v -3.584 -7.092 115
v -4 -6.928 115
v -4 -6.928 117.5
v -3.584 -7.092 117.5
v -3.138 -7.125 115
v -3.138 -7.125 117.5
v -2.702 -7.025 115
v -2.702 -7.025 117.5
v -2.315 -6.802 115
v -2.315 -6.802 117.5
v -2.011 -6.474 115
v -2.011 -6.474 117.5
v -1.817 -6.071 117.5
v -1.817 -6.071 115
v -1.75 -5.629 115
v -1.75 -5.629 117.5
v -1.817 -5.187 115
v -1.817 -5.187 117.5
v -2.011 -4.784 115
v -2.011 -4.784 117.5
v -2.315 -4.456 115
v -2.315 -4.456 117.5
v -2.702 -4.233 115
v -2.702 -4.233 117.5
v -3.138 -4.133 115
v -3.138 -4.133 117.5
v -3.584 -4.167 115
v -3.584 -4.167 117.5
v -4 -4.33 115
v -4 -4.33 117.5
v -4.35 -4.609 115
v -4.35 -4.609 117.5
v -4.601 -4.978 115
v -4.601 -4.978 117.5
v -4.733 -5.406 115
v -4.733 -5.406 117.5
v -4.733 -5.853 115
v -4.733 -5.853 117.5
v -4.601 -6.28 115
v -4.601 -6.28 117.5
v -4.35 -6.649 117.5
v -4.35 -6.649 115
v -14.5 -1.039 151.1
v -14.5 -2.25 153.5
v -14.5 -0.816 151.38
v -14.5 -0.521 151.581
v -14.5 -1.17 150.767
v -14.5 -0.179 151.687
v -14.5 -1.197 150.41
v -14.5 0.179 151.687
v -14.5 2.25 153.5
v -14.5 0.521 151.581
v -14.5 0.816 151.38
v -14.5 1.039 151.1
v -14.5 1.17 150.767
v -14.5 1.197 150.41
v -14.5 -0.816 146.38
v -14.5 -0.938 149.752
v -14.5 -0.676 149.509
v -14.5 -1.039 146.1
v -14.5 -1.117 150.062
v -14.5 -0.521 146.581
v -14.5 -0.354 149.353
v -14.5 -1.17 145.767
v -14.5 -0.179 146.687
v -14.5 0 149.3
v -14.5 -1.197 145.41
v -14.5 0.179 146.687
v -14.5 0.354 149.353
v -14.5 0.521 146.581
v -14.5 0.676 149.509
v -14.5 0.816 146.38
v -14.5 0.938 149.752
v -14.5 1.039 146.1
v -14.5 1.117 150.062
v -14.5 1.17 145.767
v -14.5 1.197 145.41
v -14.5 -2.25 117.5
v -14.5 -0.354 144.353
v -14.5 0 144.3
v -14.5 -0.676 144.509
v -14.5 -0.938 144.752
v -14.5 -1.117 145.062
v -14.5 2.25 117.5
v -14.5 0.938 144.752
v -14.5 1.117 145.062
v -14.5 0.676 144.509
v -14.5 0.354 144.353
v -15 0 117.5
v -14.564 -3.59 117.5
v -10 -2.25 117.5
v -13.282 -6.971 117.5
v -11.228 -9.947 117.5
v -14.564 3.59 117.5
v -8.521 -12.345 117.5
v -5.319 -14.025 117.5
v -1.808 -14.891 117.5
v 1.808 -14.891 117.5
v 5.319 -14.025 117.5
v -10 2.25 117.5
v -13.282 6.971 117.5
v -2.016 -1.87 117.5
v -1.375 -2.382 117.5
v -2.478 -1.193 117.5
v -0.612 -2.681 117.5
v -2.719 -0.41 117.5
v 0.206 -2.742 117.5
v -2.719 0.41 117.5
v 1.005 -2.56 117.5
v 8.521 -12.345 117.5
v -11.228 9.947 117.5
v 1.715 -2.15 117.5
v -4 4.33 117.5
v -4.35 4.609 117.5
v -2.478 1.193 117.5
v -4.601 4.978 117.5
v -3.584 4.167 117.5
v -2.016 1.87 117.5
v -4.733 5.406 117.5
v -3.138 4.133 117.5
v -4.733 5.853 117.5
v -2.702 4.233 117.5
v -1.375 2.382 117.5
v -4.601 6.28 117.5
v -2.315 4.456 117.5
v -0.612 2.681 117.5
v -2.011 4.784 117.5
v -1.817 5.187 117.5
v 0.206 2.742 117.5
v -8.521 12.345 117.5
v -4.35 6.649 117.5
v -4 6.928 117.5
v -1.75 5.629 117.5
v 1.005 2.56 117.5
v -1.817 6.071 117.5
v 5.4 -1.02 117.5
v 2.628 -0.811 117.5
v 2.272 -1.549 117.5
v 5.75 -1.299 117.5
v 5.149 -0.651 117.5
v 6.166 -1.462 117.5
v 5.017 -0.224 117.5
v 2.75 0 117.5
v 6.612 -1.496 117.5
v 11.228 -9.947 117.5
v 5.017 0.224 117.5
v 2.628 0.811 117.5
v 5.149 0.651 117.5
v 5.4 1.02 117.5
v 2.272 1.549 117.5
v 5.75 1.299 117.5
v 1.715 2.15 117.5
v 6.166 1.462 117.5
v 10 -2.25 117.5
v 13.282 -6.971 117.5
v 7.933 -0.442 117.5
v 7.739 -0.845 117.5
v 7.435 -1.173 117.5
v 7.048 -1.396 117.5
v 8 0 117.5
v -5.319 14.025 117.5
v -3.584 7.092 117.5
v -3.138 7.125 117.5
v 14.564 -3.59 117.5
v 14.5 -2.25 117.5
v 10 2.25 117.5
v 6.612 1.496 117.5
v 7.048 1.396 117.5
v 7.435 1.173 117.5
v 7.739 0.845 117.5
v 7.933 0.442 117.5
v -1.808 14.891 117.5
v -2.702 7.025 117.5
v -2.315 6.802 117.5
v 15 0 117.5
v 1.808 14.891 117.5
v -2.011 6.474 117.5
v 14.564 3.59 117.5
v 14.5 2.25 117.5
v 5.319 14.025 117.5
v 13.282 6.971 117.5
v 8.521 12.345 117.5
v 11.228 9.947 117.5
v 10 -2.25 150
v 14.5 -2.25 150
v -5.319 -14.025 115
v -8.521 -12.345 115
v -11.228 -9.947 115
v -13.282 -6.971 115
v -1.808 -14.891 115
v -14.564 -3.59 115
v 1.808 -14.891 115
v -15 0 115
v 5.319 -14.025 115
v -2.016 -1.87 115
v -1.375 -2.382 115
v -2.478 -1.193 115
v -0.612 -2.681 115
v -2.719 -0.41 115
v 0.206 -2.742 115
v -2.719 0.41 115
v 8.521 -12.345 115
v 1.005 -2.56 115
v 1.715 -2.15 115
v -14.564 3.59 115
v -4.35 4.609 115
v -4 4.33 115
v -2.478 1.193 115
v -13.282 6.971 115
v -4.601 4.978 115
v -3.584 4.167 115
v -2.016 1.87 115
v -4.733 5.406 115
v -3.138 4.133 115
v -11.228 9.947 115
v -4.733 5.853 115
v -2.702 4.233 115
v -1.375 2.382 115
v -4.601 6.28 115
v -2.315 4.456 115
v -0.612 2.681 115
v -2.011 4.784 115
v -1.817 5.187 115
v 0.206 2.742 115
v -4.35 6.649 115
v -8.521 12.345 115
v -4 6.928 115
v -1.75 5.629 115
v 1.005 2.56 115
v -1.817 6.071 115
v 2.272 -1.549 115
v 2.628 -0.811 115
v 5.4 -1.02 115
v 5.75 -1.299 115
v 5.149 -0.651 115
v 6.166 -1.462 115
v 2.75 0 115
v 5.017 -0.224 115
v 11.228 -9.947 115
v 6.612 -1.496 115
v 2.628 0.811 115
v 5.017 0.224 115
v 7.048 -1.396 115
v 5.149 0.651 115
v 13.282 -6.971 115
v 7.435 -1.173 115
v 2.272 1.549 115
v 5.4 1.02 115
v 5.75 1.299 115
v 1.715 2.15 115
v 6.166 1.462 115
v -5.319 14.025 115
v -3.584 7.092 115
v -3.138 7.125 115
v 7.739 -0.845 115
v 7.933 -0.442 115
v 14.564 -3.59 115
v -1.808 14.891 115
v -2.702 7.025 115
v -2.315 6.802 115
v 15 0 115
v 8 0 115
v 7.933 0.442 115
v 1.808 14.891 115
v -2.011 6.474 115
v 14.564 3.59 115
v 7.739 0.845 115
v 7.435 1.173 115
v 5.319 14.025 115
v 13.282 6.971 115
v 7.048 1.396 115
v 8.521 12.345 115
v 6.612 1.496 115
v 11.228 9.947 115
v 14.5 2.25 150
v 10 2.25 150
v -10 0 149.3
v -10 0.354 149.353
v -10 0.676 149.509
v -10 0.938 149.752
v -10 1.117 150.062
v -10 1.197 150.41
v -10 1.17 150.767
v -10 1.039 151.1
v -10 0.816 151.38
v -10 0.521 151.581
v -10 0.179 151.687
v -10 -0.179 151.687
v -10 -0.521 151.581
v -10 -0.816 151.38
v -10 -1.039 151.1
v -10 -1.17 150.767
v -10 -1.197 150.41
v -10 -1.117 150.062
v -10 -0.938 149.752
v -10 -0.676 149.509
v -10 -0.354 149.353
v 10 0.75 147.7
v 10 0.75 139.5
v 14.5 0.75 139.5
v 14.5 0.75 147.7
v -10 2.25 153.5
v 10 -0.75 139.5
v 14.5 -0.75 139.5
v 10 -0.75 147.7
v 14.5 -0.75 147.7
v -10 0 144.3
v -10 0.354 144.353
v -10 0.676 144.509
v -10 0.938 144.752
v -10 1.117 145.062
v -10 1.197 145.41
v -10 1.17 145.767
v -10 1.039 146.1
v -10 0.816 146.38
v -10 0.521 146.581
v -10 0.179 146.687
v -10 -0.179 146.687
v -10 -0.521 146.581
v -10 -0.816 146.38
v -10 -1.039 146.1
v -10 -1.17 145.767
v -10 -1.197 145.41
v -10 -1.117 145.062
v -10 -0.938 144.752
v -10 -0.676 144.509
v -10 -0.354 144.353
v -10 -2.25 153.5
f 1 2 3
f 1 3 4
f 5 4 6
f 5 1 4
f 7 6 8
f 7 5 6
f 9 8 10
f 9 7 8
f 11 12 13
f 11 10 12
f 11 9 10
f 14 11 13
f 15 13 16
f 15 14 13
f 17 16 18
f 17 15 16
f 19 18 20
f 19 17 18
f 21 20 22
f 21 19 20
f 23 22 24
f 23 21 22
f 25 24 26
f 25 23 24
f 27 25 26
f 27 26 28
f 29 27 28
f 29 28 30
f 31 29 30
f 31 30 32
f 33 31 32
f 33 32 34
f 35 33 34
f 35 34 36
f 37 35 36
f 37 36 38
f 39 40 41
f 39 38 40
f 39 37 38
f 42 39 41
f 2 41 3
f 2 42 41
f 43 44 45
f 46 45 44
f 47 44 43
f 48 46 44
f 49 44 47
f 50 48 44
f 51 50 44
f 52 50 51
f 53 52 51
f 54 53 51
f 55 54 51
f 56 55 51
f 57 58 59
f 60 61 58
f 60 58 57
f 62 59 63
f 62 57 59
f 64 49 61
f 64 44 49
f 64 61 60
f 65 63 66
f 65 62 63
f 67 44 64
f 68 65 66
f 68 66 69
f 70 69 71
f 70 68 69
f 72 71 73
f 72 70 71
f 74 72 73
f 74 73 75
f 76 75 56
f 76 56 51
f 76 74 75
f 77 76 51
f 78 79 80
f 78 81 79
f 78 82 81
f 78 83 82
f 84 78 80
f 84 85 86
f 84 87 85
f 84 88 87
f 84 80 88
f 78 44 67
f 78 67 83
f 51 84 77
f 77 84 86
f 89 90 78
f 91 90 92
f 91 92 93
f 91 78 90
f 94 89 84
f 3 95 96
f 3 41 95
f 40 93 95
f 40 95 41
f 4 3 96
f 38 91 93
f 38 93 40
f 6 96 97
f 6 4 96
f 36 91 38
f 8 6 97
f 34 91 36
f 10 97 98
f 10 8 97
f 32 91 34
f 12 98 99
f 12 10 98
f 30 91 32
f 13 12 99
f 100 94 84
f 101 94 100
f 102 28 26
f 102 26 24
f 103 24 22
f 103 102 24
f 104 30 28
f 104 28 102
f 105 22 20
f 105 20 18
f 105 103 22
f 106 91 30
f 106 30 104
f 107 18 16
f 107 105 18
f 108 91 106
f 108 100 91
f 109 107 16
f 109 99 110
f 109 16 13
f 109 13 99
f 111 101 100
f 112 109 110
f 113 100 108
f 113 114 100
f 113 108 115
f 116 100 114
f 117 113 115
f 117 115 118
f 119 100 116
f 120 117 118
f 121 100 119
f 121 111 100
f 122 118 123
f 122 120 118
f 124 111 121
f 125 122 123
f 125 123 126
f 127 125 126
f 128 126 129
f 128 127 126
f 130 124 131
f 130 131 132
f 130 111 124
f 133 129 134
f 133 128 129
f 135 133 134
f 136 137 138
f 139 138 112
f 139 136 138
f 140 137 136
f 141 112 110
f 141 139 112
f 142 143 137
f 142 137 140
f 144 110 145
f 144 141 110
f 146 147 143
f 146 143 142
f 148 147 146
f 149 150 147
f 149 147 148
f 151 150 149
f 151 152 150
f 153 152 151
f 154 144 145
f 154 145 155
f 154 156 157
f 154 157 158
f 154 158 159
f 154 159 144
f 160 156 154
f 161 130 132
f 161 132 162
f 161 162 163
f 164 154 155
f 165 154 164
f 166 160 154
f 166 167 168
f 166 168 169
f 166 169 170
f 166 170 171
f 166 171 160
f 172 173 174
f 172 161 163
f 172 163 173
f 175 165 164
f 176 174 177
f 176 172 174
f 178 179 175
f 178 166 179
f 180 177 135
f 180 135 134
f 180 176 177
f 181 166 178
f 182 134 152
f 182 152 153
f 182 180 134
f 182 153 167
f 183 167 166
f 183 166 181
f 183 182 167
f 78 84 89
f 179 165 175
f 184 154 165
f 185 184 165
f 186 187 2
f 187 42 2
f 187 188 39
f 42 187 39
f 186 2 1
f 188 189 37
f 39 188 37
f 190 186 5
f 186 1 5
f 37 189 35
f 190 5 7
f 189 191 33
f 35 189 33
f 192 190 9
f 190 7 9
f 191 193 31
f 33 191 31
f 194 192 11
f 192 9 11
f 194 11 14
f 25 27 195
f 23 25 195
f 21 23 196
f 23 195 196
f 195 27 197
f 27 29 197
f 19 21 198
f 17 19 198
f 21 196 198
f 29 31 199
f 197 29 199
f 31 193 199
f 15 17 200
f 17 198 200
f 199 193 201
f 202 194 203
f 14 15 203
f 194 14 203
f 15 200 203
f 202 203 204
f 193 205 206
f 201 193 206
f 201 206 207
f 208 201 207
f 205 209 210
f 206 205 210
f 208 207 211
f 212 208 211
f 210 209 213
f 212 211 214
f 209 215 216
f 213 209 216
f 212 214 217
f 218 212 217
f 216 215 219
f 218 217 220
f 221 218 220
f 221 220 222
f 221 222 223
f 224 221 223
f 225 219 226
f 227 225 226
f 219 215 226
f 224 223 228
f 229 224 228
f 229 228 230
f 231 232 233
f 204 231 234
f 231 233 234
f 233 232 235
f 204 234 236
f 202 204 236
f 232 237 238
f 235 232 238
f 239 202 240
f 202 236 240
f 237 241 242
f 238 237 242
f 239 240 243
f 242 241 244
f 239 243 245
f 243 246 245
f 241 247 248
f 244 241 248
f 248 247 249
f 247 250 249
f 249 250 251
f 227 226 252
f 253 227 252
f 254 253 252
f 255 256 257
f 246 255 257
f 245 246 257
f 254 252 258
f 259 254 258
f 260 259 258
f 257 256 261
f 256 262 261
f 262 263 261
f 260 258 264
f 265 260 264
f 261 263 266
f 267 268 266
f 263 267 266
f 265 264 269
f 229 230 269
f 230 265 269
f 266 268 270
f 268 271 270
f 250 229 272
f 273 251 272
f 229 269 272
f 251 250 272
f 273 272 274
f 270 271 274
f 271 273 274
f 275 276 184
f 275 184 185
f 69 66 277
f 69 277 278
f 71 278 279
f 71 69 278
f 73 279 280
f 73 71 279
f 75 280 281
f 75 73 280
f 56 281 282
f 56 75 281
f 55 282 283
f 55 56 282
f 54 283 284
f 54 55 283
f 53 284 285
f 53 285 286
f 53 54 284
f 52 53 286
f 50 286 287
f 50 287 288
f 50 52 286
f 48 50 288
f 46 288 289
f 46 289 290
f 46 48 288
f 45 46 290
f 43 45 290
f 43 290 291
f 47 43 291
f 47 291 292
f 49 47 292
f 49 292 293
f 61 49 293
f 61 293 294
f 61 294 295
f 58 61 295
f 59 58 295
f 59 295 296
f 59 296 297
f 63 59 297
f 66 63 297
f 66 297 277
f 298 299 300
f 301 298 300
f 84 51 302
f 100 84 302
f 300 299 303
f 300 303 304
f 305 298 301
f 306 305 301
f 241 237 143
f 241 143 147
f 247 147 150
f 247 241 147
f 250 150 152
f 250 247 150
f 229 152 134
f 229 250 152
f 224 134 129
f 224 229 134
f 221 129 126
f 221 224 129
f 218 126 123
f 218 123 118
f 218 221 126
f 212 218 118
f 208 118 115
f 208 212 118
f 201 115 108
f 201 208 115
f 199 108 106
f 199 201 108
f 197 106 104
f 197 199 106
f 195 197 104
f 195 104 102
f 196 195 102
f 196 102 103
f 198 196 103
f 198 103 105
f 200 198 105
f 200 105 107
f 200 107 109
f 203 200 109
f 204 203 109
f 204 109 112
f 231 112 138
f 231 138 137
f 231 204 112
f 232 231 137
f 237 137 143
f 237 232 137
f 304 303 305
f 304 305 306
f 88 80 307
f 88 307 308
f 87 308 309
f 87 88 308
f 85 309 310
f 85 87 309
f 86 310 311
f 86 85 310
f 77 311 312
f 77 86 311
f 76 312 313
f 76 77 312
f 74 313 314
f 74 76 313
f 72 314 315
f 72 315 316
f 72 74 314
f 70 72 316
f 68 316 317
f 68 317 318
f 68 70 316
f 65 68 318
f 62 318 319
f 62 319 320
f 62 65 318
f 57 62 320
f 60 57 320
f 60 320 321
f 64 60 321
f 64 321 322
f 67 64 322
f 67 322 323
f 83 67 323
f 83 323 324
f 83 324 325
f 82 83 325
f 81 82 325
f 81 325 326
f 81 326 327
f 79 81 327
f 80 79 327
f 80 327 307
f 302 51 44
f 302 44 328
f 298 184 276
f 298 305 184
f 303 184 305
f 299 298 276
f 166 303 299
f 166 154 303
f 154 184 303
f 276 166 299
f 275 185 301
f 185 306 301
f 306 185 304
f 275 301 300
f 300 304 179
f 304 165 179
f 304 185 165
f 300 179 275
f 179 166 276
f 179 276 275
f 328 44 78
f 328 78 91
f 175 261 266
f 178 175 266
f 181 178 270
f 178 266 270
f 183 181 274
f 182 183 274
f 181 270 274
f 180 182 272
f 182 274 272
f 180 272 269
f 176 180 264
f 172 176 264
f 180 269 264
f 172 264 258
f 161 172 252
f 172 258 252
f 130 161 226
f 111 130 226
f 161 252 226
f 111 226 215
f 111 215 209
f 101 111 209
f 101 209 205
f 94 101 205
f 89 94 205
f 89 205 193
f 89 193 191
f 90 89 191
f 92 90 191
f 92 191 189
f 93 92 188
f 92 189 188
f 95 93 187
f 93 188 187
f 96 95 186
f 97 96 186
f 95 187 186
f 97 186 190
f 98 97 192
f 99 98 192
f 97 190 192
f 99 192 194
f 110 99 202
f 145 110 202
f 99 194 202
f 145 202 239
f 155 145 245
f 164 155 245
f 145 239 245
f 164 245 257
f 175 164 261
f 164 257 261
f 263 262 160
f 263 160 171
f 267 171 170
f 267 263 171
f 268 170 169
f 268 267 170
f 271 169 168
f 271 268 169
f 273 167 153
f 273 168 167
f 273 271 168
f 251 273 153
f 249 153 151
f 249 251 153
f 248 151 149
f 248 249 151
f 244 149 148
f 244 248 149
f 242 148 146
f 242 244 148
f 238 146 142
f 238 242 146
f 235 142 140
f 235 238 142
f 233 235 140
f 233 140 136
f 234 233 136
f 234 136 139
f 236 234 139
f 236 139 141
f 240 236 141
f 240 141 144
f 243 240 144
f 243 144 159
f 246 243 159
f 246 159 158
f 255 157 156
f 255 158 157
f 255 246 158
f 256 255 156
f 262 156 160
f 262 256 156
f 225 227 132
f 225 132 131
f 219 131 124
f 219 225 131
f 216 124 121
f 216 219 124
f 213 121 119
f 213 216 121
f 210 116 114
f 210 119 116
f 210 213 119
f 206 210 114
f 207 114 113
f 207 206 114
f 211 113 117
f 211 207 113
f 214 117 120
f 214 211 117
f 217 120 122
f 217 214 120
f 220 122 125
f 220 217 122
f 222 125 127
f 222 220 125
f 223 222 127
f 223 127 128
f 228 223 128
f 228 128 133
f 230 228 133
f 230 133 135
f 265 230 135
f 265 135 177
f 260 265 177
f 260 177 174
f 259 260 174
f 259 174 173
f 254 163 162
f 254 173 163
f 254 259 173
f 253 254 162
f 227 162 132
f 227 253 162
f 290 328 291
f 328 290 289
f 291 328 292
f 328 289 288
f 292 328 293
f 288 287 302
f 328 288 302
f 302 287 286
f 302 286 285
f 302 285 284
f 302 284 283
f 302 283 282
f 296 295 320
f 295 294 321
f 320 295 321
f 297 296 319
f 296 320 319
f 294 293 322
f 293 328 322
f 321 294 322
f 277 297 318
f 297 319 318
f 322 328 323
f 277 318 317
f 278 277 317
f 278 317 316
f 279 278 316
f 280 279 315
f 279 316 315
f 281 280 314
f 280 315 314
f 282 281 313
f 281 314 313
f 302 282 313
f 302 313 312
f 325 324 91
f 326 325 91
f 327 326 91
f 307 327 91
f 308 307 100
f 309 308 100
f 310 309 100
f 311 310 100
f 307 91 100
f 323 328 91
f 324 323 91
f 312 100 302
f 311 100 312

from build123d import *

# Parameters (mm, degrees)
CYLINDER005_R     = 1.5
CYLINDER005_DEPTH = 10
ARRAY007_COUNT    = 3
TUBE014_R         = 15
TUBE014_R_2       = 2.75
TUBE014_DEPTH     = 2.5
BOX001_W          = 10
BOX001_H          = 1.5
BOX001_DEPTH      = 8.2
BOX_W             = 4.5
BOX_H             = 4.5
BOX_DEPTH         = 32.5
CYLINDER026_R     = 1.2
CYLINDER026_DEPTH = 18.5
CYLINDER027_R     = 1.2
CYLINDER027_DEPTH = 18.5
BOX021_W          = 4.5
BOX021_H          = 4.5
BOX021_DEPTH      = 36


with BuildPart() as pistonconnectorscrewcutters:
    # Cylinder005 → Cylinder005 (new body)
    with BuildSketch(Plane(origin=(6.5, 0, 110), x_dir=(1, 0, 0), z_dir=(0, 0, 1))):
        Circle(CYLINDER005_R)
    extrude(amount=CYLINDER005_DEPTH)

    # Array007: PistonConnectorScrewCutters ×3 about axis
    array007_axis = Axis((0, 0, 0), (0, 0, 1))


with BuildPart() as pistonconnectorscrewcutters_1:
    add(pistonconnectorscrewcutters.part)
    for i in range(1, ARRAY007_COUNT):
        add(pistonconnectorscrewcutters.part.rotate(array007_axis, i * 360 / ARRAY007_COUNT))


with BuildPart() as faderhookconnector:
    # Tube014 → Tube014 (new body)
    with BuildSketch(Plane.XY.offset(115)):
        Circle(TUBE014_R)
        Circle(TUBE014_R_2, mode=Mode.SUBTRACT)
    extrude(amount=TUBE014_DEPTH)


with BuildPart() as faderlevelcutter:
    # Box001 → Box001 (new body)
    with BuildSketch(Plane(origin=(7, -0.75, 139.5), x_dir=(1, 0, 0), z_dir=(0, 0, 1))):
        with Locations((5, 0.75)):
            Rectangle(BOX001_W, BOX001_H)
    extrude(amount=BOX001_DEPTH)


with BuildPart() as faderhookconnector2:
    # Box → Box (new body)
    with BuildSketch(Plane(origin=(10, -2.25, 117.5), x_dir=(1, 0, 0), z_dir=(0, 0, 1))):
        with Locations((2.25, 2.25)):
            Rectangle(BOX_W, BOX_H)
    extrude(amount=BOX_DEPTH)

    # Cut001: cut FaderLevelCutter
    add(faderlevelcutter.part, mode=Mode.SUBTRACT)

    # Fusion004: union FaderHookConnector
    add(faderhookconnector.part)

    # Cut033: cut PistonConnectorScrewCutters
    add(pistonconnectorscrewcutters_1.part, mode=Mode.SUBTRACT)


with BuildPart() as safetybuttonshookscrewcutter:
    # Cylinder026 → Cylinder026 (new body)
    with BuildSketch(Plane(origin=(-28.5, 0, 150.5), x_dir=(0, 0, -1), z_dir=(1, 0, 0))):
        Circle(CYLINDER026_R)
    extrude(amount=CYLINDER026_DEPTH)


with BuildPart() as safetybuttonhookescrewcutters:
    # Cylinder027 → Cylinder027 (new body)
    with BuildSketch(Plane(origin=(-28.5, 0, 145.5), x_dir=(0, 0, -1), z_dir=(1, 0, 0))):
        Circle(CYLINDER027_R)
    extrude(amount=CYLINDER027_DEPTH)

    # Fusion013: union SafetyButtonsHookScrewCutter
    add(safetybuttonshookscrewcutter.part)


with BuildPart() as pistonhooks:
    # Box021 → Box021 (new body)
    with BuildSketch(Plane(origin=(-14.5, -2.25, 117.5), x_dir=(1, 0, 0), z_dir=(0, 0, 1))):
        with Locations((2.25, 2.25)):
            Rectangle(BOX021_W, BOX021_H)
    extrude(amount=BOX021_DEPTH)

    # Cut050: cut SafetyButtonHookeScrewCutters
    add(safetybuttonhookescrewcutters.part, mode=Mode.SUBTRACT)

    # Fusion014: union FaderHookConnector2
    add(faderhookconnector2.part)


solid = pistonhooks.part
